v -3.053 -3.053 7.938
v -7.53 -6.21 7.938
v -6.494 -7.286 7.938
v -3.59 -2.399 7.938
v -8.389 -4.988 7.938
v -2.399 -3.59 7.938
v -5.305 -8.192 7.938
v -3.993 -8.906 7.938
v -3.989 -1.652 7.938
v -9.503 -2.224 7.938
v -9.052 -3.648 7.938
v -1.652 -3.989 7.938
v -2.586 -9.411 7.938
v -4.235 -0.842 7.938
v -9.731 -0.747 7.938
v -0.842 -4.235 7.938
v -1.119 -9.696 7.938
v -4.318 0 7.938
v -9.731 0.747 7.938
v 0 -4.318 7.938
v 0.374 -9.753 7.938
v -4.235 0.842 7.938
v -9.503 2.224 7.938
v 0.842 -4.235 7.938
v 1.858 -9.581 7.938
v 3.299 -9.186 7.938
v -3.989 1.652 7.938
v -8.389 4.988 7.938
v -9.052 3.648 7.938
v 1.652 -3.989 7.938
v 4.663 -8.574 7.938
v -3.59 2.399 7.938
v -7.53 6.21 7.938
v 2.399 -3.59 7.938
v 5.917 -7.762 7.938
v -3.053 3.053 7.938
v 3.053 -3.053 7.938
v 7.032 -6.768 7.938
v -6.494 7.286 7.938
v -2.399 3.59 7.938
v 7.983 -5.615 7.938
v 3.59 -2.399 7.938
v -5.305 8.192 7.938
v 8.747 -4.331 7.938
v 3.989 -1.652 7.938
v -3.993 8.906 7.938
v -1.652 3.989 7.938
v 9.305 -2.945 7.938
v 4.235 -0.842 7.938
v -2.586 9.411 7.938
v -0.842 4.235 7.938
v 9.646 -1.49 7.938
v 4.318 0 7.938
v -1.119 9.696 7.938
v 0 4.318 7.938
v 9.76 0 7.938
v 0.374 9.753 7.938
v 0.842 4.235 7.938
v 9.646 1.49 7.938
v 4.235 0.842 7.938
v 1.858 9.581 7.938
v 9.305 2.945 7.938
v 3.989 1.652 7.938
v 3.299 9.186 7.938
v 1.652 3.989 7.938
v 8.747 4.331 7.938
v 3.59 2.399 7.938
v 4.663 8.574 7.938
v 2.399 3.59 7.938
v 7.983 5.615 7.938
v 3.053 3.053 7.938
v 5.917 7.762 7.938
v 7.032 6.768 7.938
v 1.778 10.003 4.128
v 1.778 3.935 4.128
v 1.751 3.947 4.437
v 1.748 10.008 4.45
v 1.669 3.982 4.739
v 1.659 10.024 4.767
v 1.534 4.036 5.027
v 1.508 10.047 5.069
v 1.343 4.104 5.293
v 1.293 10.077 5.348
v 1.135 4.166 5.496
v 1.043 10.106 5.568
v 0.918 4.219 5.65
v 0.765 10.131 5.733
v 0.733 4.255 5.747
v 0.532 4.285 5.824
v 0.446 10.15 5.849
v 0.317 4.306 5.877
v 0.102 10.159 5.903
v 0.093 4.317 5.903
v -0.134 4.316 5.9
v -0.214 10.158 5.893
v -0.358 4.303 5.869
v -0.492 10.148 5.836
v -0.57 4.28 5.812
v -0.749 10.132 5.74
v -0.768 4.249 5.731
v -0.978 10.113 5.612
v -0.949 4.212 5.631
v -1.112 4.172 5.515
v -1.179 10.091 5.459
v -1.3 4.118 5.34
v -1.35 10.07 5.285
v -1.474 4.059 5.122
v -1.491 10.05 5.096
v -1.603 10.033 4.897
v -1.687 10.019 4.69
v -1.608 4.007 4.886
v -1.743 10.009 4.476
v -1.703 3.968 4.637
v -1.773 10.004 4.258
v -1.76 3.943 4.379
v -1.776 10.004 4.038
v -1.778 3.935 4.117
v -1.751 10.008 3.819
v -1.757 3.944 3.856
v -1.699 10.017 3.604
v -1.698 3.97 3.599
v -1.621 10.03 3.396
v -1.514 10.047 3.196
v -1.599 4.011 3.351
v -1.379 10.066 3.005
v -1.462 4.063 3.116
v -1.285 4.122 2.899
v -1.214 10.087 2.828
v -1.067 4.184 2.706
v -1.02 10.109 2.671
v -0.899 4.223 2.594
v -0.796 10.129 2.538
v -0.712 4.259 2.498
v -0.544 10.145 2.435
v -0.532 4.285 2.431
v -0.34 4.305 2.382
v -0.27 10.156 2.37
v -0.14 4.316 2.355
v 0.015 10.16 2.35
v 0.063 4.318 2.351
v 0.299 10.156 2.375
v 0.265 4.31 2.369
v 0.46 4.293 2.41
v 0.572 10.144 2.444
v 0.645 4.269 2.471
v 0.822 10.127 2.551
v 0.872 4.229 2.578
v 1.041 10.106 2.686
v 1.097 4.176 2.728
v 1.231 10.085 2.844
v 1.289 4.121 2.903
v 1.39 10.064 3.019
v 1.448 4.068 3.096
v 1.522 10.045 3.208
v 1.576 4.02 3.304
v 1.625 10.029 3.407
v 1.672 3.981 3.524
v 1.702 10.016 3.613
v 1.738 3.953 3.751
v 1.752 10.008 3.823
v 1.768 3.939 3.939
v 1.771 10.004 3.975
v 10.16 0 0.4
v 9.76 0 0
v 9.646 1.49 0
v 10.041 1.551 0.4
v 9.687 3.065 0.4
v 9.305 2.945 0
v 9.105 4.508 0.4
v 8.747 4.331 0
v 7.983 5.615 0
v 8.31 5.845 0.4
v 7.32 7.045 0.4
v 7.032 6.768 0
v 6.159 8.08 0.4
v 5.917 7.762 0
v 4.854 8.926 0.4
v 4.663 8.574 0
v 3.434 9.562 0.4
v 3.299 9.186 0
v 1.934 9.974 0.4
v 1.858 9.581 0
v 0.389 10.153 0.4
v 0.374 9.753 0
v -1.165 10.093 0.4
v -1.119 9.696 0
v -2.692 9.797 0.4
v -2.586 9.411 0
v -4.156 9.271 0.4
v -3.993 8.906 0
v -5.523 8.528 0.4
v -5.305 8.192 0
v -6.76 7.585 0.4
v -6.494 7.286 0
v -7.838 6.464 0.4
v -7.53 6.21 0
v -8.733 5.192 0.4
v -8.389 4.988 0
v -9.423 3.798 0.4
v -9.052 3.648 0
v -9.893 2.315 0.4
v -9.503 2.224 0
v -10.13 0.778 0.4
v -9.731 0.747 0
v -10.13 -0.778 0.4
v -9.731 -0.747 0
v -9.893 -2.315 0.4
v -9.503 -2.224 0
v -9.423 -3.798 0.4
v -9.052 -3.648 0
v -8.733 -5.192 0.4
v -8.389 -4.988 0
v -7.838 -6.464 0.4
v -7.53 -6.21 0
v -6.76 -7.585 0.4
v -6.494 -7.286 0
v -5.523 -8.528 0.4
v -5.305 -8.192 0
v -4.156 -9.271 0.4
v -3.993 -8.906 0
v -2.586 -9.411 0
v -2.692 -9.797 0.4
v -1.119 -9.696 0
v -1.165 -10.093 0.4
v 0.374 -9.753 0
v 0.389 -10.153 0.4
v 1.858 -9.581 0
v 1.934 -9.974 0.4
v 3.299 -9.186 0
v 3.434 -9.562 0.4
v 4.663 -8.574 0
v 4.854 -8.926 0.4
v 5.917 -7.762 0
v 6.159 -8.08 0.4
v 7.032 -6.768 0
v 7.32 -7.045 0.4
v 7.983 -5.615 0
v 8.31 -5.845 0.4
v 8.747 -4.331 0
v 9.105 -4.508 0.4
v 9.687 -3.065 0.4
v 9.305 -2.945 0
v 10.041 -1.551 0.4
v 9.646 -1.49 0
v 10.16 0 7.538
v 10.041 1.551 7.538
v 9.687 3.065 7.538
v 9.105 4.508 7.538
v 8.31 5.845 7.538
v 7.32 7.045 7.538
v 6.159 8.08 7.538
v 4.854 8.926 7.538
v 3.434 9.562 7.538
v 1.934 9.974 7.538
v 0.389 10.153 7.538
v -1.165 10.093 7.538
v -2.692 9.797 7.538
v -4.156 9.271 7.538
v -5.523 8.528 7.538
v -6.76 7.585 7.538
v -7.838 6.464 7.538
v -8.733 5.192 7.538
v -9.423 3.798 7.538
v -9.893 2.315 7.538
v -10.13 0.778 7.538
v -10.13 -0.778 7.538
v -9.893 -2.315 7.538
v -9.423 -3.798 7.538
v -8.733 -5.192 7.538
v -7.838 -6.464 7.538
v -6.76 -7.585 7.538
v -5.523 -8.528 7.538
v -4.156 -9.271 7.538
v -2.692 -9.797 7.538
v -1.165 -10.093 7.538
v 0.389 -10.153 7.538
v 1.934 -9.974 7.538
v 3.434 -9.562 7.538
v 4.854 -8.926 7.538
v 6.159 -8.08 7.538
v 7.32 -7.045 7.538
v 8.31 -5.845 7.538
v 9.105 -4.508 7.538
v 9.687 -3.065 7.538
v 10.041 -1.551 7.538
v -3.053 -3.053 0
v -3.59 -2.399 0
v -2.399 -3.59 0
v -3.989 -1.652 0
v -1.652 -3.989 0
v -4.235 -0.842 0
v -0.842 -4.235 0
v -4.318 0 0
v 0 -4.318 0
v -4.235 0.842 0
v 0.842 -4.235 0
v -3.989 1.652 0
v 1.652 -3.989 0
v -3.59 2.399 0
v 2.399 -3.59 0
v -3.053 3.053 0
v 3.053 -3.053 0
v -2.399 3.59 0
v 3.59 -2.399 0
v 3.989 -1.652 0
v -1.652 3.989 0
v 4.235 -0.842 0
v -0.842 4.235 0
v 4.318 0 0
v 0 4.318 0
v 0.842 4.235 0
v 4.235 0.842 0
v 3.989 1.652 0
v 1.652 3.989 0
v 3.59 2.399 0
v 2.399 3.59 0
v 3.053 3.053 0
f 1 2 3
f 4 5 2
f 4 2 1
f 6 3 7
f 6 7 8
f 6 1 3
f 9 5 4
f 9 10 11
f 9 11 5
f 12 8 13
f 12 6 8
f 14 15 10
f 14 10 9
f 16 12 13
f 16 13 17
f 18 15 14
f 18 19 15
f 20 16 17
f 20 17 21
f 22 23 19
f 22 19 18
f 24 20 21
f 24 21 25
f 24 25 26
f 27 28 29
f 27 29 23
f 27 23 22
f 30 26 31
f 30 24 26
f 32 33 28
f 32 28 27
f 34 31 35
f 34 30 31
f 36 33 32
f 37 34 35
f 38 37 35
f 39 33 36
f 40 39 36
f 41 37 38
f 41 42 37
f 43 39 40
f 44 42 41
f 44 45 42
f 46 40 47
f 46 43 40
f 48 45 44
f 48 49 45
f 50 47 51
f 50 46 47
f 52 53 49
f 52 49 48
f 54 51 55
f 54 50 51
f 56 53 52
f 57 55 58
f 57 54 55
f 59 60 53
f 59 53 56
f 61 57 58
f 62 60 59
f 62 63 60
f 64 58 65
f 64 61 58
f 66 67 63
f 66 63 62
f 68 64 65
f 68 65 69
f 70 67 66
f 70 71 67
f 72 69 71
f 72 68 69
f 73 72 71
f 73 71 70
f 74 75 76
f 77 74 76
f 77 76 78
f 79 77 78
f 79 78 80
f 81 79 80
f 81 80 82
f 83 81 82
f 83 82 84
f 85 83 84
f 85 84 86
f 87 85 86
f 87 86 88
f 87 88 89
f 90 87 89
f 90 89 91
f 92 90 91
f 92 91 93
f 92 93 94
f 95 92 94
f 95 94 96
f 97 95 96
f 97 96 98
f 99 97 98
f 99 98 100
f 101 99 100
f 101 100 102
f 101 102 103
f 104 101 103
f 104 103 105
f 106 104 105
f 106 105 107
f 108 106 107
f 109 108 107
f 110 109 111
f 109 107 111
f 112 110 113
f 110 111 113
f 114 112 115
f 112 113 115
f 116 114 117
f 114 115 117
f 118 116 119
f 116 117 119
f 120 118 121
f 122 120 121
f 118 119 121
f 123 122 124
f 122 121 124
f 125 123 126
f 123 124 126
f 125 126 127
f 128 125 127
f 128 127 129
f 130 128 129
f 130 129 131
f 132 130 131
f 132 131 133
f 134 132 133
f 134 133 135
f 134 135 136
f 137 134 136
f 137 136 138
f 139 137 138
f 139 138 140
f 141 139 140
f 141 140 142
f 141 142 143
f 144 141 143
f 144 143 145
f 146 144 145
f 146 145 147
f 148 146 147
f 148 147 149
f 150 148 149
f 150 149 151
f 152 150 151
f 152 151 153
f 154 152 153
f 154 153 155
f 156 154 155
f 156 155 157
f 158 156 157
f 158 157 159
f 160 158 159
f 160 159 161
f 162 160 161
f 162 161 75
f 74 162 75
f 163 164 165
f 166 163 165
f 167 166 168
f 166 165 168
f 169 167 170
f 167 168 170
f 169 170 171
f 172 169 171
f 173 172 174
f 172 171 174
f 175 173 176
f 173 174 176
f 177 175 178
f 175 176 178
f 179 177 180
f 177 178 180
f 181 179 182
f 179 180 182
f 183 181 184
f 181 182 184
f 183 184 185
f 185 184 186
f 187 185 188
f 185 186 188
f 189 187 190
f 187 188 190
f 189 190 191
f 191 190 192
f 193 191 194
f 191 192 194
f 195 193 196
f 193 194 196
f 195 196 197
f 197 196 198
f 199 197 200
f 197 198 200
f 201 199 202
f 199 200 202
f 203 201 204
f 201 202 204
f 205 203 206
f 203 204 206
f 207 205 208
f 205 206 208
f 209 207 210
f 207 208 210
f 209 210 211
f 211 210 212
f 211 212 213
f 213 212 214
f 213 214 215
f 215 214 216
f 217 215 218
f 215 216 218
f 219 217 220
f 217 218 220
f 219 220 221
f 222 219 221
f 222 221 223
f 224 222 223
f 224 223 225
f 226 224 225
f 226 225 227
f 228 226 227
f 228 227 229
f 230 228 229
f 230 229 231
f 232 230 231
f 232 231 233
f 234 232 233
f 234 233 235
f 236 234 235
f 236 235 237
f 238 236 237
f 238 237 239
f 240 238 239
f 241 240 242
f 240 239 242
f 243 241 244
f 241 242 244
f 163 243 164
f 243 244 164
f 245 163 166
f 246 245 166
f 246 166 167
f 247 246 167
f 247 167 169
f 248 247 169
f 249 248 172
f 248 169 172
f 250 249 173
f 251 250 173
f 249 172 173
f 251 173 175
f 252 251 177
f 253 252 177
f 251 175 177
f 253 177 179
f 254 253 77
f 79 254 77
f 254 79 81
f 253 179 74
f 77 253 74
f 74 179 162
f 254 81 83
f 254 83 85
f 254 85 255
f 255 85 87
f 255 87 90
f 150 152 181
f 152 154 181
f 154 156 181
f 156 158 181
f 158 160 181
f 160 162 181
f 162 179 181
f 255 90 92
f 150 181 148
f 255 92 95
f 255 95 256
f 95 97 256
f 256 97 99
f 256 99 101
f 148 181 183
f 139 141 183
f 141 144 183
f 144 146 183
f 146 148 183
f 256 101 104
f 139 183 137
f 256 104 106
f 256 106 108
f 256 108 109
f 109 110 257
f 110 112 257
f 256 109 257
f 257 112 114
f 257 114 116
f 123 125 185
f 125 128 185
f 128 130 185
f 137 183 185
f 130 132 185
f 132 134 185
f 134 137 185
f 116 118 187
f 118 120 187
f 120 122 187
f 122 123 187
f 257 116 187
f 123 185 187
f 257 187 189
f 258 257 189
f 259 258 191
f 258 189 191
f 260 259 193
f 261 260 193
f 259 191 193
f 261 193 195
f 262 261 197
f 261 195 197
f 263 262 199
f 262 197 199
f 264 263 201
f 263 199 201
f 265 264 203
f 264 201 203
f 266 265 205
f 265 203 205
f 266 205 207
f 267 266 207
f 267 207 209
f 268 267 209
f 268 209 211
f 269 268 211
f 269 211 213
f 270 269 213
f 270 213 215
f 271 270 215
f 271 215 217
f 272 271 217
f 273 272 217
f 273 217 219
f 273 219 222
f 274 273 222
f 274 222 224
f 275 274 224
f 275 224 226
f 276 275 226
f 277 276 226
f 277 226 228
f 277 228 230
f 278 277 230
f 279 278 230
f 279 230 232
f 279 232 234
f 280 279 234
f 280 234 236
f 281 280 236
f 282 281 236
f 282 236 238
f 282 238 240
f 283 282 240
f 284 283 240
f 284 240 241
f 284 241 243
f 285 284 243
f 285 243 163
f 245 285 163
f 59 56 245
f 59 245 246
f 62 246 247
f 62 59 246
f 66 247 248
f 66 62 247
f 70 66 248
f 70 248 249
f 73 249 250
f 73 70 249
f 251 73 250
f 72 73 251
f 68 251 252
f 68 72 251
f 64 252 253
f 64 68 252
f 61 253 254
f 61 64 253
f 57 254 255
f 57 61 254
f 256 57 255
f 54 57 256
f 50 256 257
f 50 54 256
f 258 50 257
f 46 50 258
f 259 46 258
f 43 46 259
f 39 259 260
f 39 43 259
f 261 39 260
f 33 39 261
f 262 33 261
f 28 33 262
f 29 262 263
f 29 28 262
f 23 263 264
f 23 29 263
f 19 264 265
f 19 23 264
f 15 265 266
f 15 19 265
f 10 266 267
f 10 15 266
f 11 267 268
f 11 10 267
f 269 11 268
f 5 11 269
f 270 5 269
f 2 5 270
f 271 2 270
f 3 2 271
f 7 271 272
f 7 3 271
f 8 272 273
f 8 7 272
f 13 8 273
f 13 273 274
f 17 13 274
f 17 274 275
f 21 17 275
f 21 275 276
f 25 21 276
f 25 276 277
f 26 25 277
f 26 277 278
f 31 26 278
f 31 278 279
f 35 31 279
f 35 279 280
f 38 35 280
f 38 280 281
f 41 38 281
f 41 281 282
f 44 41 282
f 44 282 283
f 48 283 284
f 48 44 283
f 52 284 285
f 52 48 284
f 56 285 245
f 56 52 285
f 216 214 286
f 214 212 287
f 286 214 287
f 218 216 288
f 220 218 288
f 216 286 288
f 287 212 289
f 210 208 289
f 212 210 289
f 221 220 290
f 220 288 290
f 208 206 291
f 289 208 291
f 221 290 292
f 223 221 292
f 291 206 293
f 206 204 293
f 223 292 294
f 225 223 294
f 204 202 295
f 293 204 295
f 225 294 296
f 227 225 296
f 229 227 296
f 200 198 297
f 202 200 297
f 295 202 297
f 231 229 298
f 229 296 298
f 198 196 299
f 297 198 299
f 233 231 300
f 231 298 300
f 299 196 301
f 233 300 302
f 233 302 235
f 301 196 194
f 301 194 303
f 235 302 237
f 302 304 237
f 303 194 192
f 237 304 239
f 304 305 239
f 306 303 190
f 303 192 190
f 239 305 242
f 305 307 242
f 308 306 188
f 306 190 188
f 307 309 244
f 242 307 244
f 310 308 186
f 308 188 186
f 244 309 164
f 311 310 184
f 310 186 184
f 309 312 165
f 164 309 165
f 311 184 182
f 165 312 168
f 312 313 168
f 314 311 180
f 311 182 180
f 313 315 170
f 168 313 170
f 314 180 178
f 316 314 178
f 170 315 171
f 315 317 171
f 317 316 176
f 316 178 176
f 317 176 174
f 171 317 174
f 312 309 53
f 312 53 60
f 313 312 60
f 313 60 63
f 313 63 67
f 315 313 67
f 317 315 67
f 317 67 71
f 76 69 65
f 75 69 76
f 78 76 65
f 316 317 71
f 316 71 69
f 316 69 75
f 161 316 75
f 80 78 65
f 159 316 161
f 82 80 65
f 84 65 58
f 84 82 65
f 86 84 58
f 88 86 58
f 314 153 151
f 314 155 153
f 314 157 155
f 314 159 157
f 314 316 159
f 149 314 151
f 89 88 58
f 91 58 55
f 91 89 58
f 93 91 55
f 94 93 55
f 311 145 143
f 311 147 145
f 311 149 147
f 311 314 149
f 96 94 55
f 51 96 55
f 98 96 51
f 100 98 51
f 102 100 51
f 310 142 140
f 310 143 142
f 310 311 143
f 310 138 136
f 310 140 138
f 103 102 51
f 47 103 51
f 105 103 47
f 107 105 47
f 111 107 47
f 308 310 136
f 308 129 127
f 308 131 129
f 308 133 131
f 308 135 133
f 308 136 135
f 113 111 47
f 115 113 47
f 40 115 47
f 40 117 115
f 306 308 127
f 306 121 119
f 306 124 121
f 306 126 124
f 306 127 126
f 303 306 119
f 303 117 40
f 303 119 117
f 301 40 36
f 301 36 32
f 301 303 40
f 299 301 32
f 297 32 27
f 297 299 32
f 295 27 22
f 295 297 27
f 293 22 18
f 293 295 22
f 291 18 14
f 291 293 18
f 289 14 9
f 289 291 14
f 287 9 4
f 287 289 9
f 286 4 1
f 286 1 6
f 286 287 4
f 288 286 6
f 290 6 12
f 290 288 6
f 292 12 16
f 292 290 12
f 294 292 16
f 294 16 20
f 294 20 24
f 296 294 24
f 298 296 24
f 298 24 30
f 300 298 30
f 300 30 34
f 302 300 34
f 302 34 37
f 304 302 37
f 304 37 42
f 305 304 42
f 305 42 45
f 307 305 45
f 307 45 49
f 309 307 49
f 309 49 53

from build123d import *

# Parameters (mm, degrees)
F0_R     = 10.16
F0_R_2   = 4.318
F1_DEPTH = 7.9375
F2_R     = 1.778
F3_DEPTH = 25.4
F4_SIZE  = 0.4


with BuildPart() as f1:
    # F0 (on Top) → F1 (new body)
    with BuildSketch(Plane.XY):
        Circle(F0_R)
        Circle(F0_R_2, mode=Mode.SUBTRACT)
    extrude(amount=F1_DEPTH)

    # F2 (on Front) → F3 (cut)
    with BuildSketch(Plane.XZ):
        with Locations((0, 4.1275)):
            Circle(F2_R)
    extrude(amount=-F3_DEPTH, mode=Mode.SUBTRACT)

    # F4
    f4_edges = [f1.edges().sort_by_distance(p)[0] for p in [
        (-10.16, 0, 0),
        (-10.16, 0, 7.9375),
    ]]
    chamfer(f4_edges, length=F4_SIZE)


solid = f1.part
